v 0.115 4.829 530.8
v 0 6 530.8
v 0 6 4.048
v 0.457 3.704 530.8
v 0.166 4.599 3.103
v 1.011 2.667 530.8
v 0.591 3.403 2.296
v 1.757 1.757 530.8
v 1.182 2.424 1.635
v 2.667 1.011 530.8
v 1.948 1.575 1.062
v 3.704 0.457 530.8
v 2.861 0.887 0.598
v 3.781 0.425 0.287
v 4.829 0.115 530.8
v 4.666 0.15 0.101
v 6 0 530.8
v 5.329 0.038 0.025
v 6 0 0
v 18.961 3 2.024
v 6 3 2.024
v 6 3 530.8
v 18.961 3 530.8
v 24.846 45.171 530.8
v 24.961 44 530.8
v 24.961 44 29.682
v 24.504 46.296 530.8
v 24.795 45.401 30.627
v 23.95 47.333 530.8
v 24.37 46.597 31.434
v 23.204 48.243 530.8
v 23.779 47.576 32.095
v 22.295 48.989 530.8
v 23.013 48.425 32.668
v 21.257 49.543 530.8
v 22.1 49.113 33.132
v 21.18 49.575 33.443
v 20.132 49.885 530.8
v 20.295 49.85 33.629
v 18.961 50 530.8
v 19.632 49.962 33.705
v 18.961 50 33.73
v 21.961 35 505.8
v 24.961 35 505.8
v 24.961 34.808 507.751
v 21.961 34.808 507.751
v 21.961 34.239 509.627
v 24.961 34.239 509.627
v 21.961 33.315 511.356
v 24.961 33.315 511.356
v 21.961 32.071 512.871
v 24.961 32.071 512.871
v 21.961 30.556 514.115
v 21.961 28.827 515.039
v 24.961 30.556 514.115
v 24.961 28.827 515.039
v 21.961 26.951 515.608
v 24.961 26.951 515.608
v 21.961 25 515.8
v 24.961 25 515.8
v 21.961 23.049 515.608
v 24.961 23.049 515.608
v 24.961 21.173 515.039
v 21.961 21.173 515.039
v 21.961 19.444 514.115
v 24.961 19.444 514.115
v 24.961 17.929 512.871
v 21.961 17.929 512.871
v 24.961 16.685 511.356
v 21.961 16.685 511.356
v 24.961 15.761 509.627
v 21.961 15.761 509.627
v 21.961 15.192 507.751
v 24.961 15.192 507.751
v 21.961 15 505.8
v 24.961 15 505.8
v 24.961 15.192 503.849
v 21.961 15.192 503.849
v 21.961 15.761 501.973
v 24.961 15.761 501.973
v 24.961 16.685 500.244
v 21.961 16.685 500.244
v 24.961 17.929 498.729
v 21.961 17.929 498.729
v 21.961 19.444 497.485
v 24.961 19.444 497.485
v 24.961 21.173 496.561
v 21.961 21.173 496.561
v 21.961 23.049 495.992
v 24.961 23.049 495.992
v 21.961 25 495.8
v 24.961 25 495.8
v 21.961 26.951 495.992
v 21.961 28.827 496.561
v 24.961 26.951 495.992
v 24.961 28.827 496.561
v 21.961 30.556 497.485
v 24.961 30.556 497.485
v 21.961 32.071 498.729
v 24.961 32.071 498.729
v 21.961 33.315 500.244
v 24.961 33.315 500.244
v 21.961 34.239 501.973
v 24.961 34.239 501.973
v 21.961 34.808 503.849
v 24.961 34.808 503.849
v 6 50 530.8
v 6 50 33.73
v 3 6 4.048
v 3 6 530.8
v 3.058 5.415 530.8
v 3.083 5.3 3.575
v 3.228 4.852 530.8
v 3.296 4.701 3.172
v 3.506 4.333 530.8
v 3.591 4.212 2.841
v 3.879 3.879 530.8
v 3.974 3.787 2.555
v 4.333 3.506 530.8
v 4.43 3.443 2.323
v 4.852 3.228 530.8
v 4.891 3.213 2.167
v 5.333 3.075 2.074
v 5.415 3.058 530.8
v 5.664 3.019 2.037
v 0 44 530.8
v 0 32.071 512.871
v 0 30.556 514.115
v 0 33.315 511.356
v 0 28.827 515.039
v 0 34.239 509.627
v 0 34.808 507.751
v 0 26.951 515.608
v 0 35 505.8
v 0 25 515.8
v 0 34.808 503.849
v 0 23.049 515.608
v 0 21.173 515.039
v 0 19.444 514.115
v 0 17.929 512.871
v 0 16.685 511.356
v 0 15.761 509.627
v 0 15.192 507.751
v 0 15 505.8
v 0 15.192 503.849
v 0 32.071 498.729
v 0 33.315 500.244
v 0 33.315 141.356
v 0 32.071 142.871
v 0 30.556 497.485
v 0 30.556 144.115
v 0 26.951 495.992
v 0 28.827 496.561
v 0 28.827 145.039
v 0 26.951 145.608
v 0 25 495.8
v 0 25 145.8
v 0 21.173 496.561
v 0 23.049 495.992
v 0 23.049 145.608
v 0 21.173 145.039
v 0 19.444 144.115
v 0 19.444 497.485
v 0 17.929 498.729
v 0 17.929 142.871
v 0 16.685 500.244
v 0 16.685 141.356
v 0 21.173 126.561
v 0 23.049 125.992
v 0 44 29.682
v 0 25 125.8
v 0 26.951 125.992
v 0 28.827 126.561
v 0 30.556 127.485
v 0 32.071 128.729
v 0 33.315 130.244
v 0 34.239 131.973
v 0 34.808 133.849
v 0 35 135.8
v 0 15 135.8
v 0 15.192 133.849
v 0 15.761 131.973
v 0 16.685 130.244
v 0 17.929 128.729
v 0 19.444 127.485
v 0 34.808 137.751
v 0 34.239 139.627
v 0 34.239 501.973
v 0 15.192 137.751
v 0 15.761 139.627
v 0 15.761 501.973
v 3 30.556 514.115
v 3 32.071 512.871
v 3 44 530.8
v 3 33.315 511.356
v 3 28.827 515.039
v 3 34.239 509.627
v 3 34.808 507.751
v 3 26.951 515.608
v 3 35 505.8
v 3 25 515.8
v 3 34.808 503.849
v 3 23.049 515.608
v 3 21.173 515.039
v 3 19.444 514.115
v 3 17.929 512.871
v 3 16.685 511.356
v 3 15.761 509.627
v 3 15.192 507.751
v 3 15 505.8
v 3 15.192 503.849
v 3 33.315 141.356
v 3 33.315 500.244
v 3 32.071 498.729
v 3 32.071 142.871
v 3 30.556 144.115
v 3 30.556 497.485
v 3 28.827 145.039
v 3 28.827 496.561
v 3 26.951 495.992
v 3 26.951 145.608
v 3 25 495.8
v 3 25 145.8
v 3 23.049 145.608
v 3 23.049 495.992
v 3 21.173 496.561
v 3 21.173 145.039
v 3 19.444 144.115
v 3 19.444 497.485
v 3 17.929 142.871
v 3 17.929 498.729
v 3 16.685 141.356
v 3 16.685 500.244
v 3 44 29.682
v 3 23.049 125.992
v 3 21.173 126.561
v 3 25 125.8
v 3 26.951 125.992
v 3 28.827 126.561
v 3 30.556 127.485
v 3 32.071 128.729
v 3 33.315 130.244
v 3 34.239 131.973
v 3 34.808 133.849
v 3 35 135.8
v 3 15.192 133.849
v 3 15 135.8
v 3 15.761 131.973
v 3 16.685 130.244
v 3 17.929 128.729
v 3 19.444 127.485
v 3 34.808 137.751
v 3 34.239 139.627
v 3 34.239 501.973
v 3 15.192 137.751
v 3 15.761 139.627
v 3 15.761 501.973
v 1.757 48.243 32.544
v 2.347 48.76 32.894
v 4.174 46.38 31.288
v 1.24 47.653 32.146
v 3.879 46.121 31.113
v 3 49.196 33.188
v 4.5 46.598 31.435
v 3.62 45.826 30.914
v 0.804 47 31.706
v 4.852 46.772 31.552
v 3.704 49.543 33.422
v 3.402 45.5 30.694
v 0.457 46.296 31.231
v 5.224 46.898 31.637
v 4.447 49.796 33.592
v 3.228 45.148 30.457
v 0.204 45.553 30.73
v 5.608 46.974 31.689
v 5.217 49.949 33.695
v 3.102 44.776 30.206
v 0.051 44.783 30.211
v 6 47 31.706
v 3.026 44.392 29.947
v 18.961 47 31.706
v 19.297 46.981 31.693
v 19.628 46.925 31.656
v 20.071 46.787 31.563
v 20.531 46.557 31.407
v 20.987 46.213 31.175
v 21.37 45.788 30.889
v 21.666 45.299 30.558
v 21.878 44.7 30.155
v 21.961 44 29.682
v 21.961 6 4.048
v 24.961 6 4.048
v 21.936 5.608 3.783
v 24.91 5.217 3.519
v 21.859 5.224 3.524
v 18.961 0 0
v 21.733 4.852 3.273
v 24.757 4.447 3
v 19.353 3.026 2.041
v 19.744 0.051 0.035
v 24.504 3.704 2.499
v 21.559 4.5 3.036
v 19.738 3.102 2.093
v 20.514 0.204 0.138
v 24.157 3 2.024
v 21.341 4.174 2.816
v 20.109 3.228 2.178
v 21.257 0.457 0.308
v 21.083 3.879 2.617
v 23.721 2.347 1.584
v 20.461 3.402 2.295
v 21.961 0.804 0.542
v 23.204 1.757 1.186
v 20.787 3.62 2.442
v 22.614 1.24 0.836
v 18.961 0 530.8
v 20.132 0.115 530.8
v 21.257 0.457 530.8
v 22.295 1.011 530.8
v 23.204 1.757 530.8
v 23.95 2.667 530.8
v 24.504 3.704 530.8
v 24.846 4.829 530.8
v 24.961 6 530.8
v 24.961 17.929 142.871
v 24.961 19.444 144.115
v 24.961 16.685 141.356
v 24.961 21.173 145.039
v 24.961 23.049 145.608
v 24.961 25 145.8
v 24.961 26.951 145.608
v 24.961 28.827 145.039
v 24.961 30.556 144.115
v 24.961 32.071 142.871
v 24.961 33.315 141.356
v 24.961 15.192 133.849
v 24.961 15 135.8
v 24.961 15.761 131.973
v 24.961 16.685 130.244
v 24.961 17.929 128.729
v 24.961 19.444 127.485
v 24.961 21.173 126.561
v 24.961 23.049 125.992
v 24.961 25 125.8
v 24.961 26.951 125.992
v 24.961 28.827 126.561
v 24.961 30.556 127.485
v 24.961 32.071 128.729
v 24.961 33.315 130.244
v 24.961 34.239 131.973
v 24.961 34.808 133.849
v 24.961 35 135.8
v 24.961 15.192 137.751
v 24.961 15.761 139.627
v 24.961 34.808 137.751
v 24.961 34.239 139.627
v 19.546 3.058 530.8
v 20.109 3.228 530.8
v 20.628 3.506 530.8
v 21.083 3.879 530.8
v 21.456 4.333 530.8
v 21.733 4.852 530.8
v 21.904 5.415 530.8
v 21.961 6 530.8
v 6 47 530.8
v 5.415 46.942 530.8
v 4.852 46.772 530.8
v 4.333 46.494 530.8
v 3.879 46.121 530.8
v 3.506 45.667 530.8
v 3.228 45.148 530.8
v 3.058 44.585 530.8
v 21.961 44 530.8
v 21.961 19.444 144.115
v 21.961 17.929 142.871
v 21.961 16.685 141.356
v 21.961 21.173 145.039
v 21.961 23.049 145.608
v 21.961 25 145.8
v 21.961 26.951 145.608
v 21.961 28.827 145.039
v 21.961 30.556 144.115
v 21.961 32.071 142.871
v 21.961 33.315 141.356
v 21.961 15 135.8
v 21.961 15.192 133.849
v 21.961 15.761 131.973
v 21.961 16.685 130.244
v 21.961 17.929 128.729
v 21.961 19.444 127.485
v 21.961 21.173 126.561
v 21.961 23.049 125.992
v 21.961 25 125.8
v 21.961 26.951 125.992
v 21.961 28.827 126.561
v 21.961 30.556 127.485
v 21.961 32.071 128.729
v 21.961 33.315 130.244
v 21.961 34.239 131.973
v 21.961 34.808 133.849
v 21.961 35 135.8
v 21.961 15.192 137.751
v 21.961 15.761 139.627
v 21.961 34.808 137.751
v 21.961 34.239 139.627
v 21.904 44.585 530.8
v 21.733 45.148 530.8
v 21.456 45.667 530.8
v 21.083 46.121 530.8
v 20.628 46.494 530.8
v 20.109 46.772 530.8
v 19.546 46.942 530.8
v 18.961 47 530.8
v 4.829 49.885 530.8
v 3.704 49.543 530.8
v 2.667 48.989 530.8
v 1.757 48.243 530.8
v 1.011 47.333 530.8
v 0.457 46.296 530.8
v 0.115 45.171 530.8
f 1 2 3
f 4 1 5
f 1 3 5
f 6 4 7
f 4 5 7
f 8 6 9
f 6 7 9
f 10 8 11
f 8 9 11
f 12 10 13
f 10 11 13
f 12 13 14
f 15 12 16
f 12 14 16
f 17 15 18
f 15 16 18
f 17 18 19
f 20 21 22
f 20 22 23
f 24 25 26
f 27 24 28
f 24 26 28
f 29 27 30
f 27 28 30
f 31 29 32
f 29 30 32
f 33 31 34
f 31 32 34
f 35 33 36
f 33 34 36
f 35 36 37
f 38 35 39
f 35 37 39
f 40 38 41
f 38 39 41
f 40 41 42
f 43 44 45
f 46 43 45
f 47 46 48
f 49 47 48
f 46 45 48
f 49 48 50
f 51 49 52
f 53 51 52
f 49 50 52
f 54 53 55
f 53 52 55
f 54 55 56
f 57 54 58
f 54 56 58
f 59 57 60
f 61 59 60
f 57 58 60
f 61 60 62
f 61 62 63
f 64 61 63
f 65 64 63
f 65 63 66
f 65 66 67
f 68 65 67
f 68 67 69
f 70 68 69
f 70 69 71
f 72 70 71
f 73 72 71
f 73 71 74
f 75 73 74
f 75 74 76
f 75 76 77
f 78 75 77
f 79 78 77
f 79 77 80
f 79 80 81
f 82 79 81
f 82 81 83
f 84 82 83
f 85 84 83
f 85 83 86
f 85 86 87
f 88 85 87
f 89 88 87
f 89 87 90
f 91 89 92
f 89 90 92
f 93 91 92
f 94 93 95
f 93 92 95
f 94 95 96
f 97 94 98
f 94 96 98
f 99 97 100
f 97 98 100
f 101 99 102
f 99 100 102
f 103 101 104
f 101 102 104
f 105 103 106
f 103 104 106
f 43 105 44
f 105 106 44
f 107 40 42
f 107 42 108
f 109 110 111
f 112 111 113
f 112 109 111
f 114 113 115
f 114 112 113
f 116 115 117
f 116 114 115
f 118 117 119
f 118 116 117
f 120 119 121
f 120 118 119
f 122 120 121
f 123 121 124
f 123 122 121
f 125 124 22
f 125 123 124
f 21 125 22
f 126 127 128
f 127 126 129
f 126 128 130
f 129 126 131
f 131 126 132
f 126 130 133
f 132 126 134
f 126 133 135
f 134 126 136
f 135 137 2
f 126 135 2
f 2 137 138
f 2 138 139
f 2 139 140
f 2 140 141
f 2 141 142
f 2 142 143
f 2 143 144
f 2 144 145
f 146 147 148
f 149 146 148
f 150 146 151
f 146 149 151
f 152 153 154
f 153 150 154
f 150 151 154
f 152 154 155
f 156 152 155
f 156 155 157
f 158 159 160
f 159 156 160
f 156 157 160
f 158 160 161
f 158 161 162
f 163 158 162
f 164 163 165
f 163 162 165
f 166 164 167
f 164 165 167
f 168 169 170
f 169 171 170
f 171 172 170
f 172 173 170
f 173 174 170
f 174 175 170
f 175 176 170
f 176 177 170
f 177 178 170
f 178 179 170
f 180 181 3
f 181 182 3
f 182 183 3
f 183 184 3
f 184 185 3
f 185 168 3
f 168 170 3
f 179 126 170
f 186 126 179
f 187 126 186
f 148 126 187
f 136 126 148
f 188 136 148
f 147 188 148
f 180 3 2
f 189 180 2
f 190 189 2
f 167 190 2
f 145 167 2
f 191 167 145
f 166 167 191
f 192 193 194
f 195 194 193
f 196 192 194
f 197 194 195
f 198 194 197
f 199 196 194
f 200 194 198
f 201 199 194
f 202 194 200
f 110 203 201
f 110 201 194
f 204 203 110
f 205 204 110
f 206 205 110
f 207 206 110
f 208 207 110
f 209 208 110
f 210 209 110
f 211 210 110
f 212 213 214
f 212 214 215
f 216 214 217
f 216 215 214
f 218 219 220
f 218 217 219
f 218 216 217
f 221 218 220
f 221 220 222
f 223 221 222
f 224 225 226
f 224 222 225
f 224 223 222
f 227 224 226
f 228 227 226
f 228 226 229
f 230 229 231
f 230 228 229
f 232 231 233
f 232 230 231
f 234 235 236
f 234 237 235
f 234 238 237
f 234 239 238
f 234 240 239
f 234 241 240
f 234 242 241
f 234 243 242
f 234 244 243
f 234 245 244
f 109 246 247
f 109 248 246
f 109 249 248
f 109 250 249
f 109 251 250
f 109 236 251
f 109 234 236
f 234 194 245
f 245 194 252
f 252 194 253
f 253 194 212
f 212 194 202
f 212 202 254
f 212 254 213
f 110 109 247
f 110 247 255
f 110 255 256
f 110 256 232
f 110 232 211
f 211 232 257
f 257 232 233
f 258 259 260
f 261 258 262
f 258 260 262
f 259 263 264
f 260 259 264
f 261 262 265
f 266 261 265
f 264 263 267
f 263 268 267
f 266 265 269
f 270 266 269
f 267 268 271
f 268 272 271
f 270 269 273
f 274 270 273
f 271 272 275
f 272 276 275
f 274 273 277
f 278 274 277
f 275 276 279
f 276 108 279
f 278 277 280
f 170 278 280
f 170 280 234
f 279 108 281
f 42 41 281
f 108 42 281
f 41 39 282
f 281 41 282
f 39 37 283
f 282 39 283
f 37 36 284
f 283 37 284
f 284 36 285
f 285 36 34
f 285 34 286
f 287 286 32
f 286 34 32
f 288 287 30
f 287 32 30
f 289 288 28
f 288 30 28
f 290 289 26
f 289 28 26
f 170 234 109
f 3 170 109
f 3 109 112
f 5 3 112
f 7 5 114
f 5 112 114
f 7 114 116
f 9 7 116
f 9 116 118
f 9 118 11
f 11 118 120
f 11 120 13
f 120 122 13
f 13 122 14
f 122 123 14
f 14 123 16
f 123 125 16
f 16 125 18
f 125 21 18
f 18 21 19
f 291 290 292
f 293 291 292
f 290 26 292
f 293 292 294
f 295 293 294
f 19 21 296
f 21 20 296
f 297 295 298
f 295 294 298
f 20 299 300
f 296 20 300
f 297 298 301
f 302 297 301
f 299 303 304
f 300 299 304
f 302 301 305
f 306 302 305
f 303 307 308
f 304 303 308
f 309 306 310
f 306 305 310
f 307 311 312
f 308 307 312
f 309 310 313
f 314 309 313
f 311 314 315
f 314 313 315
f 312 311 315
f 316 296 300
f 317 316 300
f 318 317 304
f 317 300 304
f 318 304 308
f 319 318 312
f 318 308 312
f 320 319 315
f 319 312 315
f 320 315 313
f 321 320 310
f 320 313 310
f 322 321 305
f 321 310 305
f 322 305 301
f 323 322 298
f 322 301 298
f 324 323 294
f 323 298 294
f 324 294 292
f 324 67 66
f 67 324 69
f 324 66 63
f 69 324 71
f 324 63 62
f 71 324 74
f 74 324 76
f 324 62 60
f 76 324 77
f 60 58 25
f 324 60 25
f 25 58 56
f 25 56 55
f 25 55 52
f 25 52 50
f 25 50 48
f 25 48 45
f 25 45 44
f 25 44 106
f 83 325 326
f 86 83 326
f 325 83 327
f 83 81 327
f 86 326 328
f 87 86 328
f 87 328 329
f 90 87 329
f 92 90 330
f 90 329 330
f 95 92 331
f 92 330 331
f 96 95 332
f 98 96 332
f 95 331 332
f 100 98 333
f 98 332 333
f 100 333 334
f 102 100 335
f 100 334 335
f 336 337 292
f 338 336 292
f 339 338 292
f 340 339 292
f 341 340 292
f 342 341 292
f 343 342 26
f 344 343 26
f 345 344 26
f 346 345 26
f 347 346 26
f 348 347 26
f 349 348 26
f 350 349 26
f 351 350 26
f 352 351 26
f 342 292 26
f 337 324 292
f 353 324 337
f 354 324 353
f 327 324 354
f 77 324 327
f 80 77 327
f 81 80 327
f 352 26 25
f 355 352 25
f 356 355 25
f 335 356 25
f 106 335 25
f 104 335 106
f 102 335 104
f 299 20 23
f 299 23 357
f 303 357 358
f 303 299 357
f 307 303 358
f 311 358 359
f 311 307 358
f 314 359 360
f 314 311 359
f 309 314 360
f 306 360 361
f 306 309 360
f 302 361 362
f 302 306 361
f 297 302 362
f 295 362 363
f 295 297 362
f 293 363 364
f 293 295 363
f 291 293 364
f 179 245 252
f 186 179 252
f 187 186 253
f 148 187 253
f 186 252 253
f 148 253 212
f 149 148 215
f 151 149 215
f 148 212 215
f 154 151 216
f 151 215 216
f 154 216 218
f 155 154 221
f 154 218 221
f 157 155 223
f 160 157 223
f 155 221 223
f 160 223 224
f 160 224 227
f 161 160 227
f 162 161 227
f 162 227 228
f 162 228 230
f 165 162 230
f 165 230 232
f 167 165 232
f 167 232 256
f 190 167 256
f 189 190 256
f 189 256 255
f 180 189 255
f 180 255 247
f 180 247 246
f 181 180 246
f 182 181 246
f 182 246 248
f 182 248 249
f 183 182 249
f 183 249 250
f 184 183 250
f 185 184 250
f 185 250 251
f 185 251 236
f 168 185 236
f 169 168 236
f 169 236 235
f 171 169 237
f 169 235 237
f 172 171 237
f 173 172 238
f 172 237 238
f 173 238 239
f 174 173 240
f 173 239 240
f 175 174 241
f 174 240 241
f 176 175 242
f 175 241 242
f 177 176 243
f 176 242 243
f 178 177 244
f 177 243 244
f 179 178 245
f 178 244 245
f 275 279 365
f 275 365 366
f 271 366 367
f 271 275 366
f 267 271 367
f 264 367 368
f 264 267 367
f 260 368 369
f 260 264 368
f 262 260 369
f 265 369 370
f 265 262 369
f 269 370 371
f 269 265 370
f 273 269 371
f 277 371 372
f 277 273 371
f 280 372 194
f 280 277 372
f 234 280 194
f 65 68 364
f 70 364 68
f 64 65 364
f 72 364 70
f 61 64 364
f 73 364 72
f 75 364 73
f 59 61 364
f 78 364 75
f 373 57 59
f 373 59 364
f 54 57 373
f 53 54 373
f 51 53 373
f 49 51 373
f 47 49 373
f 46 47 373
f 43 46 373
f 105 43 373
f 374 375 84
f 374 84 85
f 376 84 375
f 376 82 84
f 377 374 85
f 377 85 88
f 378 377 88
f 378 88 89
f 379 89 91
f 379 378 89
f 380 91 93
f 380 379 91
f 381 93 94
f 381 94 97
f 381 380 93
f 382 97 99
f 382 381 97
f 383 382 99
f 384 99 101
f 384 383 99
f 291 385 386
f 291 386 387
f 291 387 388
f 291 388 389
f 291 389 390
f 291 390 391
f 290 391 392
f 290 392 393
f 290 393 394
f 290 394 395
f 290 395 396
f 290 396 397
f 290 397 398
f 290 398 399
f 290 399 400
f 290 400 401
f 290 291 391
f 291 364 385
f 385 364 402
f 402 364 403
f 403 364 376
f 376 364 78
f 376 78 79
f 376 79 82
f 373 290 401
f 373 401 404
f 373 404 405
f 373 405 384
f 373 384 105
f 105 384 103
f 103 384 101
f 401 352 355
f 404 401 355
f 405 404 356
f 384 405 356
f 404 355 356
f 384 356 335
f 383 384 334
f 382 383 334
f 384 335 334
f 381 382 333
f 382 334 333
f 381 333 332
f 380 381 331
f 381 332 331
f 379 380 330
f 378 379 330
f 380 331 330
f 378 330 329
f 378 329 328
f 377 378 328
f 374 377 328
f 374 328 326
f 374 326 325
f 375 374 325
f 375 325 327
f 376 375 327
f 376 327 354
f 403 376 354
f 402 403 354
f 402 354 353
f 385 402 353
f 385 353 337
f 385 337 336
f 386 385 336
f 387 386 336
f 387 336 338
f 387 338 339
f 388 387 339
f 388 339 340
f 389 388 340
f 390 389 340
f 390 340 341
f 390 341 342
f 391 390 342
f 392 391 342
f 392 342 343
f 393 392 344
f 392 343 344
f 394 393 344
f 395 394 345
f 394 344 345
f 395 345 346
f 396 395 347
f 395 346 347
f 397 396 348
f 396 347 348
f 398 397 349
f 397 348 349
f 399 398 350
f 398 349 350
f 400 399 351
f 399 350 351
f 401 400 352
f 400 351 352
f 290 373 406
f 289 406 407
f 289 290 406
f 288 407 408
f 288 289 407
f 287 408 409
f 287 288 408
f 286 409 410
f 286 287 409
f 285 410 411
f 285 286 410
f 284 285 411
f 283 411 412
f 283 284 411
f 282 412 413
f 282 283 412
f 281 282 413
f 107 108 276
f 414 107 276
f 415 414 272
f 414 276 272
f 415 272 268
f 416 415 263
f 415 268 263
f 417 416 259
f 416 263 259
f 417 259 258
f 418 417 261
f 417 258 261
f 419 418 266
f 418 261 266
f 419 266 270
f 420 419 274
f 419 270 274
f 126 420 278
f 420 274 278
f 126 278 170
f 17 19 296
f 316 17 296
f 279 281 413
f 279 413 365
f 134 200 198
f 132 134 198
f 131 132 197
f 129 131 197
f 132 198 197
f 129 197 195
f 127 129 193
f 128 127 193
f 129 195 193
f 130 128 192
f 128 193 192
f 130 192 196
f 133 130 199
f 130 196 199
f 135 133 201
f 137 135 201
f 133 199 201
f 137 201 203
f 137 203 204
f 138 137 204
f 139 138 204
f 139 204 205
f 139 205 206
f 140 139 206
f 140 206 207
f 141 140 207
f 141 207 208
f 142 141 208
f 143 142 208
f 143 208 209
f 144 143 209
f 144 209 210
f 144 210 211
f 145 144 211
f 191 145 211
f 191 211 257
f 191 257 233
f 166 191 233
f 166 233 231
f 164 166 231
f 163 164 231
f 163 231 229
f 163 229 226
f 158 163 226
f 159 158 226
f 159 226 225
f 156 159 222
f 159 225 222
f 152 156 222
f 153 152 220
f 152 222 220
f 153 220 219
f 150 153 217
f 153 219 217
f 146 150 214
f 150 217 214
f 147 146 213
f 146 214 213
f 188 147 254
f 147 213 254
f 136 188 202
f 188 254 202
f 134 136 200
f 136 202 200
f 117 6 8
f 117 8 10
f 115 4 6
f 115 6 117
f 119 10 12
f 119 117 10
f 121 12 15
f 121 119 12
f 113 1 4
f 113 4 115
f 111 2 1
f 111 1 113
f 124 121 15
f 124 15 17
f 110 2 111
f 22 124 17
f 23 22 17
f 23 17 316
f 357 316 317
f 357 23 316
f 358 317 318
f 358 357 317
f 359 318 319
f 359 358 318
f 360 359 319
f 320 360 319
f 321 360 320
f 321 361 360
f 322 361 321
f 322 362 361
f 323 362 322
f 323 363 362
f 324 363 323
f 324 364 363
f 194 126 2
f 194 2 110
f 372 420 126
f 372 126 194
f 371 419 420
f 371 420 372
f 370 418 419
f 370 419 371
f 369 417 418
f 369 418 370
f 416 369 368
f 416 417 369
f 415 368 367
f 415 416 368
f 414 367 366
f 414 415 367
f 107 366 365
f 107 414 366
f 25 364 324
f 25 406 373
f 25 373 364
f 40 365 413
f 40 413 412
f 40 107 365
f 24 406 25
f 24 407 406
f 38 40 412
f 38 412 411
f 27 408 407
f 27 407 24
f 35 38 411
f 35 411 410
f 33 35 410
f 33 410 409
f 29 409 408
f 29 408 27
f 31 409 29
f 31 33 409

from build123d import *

# Parameters (mm, degrees)
BOSS_EXTRUDE1_DEPTH = 530.8
SKETCH2_R           = 10
CUT_EXTRUDE1_DEPTH  = 534.733736359
CUT_EXTRUDE2_DEPTH  = 534.733736359


with BuildPart() as part:
    # Sketch1 → Boss-Extrude1 (new body)
    with BuildSketch(Plane.XY):
        with BuildLine():
            Line((0, 44), (0, 6))
            ThreePointArc((0, 6), (1.757359313, 1.757359313), (6, 0))
            Line((6, 0), (18.96119643, 0))
            ThreePointArc((18.96119643, 0), (23.203837117, 1.757359313), (24.96119643, 6))
            Line((24.96119643, 6), (24.96119643, 44))
            ThreePointArc((24.96119643, 44), (23.203837117, 48.242640687), (18.96119643, 50))
            Line((18.96119643, 50), (6, 50))
            ThreePointArc((6, 50), (1.757359313, 48.242640687), (0, 44))
        make_face()
        with BuildLine():
            Line((3, 44), (3, 6))
            ThreePointArc((3, 6), (3.878679656, 3.878679656), (6, 3))
            Line((6, 3), (18.96119643, 3))
            ThreePointArc((18.96119643, 3), (21.082516774, 3.878679656), (21.96119643, 6))
            Line((21.96119643, 6), (21.96119643, 44))
            ThreePointArc((21.96119643, 44), (21.082516774, 46.121320344), (18.96119643, 47))
            Line((18.96119643, 47), (6, 47))
            ThreePointArc((6, 47), (3.878679656, 46.121320344), (3, 44))
        make_face(mode=Mode.SUBTRACT)
    extrude(amount=BOSS_EXTRUDE1_DEPTH)

    # Sketch2 → Cut-Extrude1 (cut, through all)
    with BuildSketch(Plane(origin=(24.96119643, 0, 0), x_dir=(0, 0, -1), z_dir=(1, 0, 0))):
        with Locations((-505.8, 25)):
            Circle(SKETCH2_R)
        Polygon((0, 0), (0, 50), (-33.73, 50), align=None)
    extrude(amount=-CUT_EXTRUDE1_DEPTH, mode=Mode.SUBTRACT)

    # Sketch2<6> → Cut-Extrude2 (cut, through all)
    with BuildSketch(Plane(origin=(24.96119643, 0, 0), x_dir=(0, 0, -1), z_dir=(1, 0, 0))):
        with BuildLine():
            ThreePointArc((-125.8, 25), (-135.8, 35), (-145.8, 25))
            ThreePointArc((-145.8, 25), (-135.8, 15), (-125.8, 25))
        make_face()
    extrude(amount=-CUT_EXTRUDE2_DEPTH, mode=Mode.SUBTRACT)


solid = part.part
